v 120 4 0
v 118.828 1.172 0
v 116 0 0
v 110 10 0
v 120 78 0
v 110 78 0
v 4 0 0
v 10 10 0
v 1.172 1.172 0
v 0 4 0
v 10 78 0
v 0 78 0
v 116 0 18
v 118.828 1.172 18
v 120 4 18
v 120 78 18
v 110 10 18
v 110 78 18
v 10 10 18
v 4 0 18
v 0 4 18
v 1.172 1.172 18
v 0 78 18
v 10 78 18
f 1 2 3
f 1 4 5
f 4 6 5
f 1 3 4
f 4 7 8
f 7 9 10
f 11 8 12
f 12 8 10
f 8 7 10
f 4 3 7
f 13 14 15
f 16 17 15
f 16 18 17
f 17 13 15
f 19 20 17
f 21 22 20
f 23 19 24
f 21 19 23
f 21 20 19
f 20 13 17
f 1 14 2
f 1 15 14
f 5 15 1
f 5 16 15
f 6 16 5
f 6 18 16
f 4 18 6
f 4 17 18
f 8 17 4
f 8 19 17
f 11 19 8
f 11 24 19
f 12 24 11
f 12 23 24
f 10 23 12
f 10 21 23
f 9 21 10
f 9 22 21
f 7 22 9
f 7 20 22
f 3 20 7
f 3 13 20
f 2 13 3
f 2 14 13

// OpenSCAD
$fn = 32;

// ----------------------------------------------------------------------
// Heat sink frame: 120 x 78 mm frame, 10 mm walls
// ----------------------------------------------------------------------

// --- parameters (mm) ---
profile_height = 18;      // extrusion height
profile_points = 12;      // points of the closed outline

profile = [[0, 4], [1.172, 1.172], [4, 0], [116, 0], [118.828, 1.172], [120, 4], [120, 78], [110, 78], [110, 10], [10, 10], [10, 78], [0, 78]];  // single closed polygon, 12 points, counter clockwise

// --- the one profile operation ---
linear_extrude(height = profile_height) polygon(points = profile);
